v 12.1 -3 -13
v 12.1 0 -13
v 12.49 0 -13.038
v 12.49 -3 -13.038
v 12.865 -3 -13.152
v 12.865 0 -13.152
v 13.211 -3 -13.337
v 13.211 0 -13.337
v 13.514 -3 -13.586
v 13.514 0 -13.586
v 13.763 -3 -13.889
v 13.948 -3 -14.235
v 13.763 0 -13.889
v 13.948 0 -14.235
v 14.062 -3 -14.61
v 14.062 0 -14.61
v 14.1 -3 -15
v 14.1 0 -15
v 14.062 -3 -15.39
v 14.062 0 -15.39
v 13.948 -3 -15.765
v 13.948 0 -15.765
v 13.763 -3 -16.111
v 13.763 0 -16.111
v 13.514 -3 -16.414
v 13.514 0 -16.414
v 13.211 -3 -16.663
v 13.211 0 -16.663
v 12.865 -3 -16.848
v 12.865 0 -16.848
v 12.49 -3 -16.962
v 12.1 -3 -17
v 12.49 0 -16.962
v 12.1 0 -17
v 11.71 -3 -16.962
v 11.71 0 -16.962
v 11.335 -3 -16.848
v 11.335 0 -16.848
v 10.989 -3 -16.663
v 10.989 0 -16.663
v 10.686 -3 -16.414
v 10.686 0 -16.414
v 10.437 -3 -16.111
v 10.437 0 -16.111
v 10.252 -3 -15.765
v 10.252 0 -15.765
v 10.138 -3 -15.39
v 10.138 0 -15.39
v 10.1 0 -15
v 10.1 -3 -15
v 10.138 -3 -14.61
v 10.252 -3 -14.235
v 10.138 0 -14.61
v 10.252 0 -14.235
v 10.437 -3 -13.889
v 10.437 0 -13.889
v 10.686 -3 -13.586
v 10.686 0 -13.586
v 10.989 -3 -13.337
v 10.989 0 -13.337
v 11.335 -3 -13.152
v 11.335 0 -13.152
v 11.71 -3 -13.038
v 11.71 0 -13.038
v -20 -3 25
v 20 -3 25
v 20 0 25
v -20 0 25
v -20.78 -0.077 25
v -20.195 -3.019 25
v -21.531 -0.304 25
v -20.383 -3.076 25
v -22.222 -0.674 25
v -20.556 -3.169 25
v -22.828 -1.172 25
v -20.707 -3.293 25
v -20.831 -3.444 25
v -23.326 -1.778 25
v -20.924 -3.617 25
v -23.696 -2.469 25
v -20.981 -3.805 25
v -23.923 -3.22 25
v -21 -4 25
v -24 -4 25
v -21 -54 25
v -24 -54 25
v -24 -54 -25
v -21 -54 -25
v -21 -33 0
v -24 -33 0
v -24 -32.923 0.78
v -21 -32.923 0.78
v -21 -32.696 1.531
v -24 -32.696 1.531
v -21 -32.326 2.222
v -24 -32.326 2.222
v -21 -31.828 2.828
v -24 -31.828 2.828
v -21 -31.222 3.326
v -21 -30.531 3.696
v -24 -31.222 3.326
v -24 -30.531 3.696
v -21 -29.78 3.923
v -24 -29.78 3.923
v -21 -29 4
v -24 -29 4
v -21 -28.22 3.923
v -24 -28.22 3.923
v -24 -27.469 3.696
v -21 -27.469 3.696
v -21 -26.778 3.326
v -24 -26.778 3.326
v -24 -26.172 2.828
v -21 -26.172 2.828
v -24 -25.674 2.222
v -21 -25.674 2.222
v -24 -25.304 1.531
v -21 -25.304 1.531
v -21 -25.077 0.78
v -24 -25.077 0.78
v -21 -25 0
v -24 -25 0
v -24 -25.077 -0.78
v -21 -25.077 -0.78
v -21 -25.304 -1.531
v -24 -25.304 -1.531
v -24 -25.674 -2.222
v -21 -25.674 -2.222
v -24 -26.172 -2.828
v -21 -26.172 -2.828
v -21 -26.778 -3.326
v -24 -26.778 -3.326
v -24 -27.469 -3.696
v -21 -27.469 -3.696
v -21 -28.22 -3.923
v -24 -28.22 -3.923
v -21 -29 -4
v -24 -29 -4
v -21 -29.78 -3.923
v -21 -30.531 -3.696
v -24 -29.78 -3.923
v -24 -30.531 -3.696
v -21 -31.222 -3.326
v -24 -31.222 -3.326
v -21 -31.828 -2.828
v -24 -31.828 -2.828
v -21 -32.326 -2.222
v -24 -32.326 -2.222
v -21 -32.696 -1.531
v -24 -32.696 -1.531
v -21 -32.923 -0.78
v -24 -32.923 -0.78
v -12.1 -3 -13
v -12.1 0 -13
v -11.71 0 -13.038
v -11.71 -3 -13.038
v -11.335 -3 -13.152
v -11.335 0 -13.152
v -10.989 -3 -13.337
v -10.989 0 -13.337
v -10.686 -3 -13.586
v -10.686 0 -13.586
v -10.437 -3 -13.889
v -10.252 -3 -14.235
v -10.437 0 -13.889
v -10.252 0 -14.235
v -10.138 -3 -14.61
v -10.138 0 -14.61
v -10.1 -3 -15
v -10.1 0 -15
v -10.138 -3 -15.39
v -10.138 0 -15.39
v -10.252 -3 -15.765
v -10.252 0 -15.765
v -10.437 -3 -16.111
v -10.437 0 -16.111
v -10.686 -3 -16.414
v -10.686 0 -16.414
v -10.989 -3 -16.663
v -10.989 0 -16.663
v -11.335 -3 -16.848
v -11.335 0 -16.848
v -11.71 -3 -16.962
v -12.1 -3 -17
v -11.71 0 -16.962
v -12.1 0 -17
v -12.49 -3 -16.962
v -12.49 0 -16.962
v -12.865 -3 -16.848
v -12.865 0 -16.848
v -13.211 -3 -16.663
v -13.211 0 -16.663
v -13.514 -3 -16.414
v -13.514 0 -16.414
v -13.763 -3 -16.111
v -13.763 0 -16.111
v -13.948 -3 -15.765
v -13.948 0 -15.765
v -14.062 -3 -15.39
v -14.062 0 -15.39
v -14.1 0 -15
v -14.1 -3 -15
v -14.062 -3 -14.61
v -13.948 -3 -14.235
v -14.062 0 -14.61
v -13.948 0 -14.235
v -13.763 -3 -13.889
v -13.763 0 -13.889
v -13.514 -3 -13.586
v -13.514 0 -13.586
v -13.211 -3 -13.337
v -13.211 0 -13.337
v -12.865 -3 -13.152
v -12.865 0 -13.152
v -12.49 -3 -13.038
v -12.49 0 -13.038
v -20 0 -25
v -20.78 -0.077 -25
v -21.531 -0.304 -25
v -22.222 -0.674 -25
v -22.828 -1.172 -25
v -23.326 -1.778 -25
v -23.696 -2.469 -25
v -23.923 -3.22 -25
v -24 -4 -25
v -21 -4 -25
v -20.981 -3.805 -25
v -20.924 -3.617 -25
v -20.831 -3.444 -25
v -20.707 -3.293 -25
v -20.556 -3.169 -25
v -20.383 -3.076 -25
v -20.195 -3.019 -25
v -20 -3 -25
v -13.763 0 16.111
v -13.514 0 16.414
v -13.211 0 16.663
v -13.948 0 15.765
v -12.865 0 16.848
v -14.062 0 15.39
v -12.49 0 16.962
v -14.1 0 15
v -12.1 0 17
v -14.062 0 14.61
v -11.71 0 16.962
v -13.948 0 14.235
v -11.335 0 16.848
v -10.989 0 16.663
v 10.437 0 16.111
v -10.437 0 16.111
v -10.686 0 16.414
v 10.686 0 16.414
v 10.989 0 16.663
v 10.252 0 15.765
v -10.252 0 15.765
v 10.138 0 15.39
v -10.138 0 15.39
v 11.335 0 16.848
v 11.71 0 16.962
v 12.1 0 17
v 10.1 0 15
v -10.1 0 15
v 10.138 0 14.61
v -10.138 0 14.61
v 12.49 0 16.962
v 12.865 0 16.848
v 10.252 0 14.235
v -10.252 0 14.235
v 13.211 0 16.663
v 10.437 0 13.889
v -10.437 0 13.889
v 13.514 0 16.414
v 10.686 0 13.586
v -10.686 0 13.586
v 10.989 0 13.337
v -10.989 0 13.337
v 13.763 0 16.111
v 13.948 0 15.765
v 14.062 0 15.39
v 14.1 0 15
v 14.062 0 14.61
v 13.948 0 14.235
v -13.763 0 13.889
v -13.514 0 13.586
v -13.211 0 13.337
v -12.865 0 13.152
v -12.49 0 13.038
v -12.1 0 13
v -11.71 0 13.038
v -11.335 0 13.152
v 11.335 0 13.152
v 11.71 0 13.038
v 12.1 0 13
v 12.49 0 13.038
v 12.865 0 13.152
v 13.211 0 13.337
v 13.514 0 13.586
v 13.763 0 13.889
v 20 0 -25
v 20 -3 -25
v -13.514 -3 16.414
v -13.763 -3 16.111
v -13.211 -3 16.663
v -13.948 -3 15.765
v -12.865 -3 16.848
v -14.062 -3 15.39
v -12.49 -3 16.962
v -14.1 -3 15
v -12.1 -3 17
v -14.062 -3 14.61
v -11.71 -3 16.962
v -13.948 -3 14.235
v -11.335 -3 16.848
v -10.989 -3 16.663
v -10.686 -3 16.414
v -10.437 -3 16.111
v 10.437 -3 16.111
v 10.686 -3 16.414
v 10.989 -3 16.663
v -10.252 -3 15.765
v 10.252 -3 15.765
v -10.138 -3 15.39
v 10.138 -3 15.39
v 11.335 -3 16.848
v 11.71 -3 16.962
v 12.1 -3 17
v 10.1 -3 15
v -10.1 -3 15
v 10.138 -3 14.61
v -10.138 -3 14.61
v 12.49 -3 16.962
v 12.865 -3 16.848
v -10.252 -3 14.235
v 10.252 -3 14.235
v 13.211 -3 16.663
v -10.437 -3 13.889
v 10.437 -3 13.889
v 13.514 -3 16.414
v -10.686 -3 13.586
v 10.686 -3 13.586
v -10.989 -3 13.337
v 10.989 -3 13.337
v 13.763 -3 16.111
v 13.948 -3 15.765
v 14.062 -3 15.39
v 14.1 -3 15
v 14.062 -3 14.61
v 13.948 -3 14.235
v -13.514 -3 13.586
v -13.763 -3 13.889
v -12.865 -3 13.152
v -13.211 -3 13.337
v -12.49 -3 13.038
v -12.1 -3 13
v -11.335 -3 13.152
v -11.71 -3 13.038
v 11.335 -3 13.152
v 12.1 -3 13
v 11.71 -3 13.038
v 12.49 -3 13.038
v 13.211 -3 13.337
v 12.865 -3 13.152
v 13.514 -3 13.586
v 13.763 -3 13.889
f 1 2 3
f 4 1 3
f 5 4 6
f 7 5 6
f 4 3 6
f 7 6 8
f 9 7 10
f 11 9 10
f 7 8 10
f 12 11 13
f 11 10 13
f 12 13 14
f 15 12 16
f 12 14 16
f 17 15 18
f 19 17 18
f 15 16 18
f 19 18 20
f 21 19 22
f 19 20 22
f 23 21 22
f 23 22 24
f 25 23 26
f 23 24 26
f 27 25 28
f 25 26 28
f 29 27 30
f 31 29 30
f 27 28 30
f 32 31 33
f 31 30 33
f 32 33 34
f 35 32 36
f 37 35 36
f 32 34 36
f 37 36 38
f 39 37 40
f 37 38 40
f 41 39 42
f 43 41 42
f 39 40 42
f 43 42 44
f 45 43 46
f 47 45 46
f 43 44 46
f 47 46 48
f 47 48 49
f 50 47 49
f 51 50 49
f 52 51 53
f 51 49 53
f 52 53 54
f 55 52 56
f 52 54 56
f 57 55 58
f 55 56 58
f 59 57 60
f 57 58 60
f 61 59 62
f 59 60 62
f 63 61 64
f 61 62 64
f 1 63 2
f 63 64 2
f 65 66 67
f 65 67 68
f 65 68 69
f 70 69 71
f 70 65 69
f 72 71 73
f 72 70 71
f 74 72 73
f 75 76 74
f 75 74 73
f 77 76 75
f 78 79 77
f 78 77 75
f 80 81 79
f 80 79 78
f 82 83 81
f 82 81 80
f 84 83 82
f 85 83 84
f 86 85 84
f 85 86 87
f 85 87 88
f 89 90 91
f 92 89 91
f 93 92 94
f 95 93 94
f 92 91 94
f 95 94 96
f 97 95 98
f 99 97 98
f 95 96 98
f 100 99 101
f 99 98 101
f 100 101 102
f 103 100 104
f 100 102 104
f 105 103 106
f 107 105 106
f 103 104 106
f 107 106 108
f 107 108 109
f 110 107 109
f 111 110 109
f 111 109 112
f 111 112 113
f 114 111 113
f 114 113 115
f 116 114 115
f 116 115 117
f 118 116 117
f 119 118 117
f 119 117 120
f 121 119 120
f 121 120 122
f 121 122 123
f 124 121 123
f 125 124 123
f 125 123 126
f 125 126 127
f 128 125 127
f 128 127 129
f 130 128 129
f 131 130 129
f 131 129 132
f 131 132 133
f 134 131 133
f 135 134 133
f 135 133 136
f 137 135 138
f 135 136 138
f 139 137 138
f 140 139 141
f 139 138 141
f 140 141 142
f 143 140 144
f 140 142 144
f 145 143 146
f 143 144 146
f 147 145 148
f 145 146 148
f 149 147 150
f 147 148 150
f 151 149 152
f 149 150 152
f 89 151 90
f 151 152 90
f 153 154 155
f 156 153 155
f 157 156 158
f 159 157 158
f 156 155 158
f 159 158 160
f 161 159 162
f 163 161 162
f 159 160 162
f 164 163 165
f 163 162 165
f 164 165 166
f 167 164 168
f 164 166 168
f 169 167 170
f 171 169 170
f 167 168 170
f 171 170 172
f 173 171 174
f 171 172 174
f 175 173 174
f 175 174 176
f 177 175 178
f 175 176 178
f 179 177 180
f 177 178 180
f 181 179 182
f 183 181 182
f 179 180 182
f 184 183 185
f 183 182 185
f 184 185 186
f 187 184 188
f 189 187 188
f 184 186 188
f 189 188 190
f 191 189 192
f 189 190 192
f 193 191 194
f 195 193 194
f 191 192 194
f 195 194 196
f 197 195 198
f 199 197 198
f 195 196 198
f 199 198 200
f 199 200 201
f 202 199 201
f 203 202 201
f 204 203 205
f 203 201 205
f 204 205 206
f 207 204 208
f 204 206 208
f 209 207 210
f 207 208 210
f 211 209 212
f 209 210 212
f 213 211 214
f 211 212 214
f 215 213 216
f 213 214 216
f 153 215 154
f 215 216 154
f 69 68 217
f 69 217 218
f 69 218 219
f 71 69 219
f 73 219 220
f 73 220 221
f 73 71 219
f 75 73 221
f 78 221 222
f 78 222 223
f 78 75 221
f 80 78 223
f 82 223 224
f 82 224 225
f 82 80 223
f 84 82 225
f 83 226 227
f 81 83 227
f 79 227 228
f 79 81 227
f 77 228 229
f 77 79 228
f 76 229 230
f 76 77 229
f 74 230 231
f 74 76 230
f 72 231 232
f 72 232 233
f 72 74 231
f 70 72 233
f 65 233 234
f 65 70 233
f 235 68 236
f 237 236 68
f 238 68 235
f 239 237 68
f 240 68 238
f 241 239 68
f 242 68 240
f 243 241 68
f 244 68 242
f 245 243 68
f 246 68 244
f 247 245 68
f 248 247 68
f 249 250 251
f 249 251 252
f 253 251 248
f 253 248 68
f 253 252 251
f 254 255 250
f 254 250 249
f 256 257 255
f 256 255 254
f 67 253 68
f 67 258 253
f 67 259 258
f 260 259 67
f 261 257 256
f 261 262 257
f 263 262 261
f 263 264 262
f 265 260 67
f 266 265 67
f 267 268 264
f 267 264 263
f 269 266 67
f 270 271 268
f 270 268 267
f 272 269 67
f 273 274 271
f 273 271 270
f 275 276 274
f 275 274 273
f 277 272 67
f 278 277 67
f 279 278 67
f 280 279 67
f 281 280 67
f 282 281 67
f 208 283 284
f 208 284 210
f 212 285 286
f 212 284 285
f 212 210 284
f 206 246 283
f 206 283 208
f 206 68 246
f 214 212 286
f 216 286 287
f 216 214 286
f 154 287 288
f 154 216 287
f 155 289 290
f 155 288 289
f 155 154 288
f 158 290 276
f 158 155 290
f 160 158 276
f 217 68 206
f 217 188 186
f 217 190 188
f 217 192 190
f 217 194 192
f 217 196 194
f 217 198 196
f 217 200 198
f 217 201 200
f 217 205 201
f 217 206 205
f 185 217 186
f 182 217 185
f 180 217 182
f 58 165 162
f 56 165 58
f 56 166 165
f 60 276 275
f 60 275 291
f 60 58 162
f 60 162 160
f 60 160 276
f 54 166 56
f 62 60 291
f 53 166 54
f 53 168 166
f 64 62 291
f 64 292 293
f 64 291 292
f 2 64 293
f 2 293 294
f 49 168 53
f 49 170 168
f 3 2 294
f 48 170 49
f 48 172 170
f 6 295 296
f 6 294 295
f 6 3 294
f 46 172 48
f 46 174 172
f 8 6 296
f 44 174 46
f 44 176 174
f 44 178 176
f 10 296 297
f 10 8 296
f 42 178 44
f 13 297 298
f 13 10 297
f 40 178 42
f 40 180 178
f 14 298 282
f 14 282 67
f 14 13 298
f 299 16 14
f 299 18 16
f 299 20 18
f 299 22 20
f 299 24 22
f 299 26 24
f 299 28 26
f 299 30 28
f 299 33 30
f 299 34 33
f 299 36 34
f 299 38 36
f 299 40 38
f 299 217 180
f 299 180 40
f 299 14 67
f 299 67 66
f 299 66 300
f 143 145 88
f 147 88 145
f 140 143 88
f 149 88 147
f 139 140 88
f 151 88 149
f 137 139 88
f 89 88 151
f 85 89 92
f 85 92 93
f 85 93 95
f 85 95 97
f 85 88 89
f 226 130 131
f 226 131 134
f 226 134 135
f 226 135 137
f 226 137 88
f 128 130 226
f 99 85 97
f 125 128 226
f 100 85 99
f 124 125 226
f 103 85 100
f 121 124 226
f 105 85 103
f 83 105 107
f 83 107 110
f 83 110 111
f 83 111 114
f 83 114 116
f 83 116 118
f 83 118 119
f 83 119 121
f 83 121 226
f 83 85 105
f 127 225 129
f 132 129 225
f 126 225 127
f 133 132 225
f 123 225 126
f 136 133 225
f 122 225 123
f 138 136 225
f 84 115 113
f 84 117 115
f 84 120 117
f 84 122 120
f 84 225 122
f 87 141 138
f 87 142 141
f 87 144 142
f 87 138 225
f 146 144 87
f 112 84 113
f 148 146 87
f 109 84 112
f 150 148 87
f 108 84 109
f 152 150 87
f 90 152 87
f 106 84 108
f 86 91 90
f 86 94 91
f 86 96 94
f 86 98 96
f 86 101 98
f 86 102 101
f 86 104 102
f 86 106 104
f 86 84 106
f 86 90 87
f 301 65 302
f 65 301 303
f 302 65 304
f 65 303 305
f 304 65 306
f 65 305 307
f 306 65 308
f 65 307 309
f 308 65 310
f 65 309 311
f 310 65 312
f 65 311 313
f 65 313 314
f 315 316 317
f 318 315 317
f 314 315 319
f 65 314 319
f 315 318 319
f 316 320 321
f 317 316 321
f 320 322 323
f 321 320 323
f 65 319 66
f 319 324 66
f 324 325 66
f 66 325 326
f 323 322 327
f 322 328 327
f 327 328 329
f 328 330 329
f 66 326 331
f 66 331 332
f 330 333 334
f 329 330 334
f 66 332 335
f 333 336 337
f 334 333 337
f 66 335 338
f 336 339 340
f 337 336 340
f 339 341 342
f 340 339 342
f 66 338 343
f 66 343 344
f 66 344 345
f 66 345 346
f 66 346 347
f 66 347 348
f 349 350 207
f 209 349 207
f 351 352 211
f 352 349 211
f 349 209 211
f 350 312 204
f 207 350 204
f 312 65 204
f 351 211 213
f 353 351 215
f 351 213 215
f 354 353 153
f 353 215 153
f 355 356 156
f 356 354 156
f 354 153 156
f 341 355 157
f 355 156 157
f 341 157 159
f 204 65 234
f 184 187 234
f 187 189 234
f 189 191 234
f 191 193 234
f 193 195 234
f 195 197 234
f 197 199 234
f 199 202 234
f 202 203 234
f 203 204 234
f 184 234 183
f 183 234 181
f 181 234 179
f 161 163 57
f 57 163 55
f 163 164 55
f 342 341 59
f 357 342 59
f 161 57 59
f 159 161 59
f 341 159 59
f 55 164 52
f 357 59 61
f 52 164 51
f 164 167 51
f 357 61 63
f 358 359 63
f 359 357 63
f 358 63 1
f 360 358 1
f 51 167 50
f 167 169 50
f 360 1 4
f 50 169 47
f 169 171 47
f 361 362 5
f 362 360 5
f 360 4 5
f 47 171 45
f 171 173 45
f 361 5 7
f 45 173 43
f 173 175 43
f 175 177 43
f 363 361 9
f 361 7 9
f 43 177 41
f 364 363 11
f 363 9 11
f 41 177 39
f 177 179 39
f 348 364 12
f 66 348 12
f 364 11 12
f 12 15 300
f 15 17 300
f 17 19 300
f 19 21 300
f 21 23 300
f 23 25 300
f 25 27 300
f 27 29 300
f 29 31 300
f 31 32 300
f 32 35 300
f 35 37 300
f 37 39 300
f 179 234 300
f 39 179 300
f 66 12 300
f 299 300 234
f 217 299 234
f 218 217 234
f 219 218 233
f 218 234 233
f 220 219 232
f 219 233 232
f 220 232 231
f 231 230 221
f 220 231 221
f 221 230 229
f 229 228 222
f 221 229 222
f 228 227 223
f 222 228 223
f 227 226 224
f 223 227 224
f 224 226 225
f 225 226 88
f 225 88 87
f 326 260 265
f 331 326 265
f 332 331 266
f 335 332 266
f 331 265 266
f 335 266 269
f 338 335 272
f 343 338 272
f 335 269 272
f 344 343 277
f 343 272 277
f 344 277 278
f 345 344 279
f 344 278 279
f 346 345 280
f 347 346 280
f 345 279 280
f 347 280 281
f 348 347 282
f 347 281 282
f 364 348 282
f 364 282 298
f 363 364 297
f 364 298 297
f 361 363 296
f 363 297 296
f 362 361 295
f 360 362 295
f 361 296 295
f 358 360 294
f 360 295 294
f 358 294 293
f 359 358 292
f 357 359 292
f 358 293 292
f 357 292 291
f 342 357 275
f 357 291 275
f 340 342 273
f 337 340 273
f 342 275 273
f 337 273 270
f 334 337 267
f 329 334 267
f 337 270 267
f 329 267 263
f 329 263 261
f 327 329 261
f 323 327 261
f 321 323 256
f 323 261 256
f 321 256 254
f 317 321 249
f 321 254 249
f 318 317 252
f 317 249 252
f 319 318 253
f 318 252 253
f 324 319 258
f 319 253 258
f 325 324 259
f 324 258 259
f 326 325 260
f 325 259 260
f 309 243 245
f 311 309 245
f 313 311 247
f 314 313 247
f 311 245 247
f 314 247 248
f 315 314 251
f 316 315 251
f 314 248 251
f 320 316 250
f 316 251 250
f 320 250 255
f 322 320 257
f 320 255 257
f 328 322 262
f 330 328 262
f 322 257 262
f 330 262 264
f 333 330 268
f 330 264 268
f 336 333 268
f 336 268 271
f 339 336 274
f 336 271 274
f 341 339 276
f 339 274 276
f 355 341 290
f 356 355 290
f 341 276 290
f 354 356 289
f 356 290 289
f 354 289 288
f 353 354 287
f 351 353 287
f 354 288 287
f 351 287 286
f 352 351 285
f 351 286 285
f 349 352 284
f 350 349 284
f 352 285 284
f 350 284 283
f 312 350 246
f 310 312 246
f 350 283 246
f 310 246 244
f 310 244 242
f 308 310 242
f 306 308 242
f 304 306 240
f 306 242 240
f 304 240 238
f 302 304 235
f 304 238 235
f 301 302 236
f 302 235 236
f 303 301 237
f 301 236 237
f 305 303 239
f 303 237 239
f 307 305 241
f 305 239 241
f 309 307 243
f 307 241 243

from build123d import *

# Parameters (mm, degrees)
SKETCH_1_W             = 40
SKETCH_1_H             = 50
SKETCH_1_R             = 2
SM_BASE_FLANGE_1_DEPTH = 3
SM_EDGE_FLANGE_1_DEPTH = 50
SKETCH_12_R            = 4
CUT_EXTRUDE_1_DEPTH    = 75.006756448


# Sheet-metal steps are written as plain solids
with BuildPart() as part:
    # Sketch 1 → 基体-法兰1 (new body)
    with BuildSketch(Plane(origin=(0, 0, 0), x_dir=(1, 0, 0), z_dir=(0, 1, 0))):
        Rectangle(SKETCH_1_W, SKETCH_1_H)
        with Locations(Location((12.1, 15, 0), (0, 0, 270))):
            Circle(SKETCH_1_R, mode=Mode.SUBTRACT)
        with Locations(Location((-12.1, -15, 0), (0, 0, 270))):
            Circle(SKETCH_1_R, mode=Mode.SUBTRACT)
        with Locations(Location((-12.1, 15, 0), (0, 0, 270))):
            Circle(SKETCH_1_R, mode=Mode.SUBTRACT)
        with Locations(Location((12.1, -15, 0), (0, 0, 270))):
            Circle(SKETCH_1_R, mode=Mode.SUBTRACT)
    extrude(amount=-SM_BASE_FLANGE_1_DEPTH)

    # 边线-法兰1 section (across the edge) → 边线-法兰1 (add)
    with BuildSketch(Plane(origin=(-21, -3, 25), x_dir=(1, 0, 0), z_dir=(0, 0, -1))):
        with BuildLine():
            Line((-3, 1), (-3, 51))
            Line((-3, 51), (0, 51))
            Line((0, 51), (0, 1))
            ThreePointArc((0, 1), (0.292893219, 0.292893219), (1, 0))
            Line((1, 0), (1, -3))
            ThreePointArc((1, -3), (-1.828427125, -1.828427125), (-3, 1))
        make_face()
    extrude(amount=SM_EDGE_FLANGE_1_DEPTH)

    # 草图12 → 切除-拉伸1 (cut, through all)
    with BuildSketch(Plane.ZY.offset(24)):
        with Locations(Location((0, -29, 0), (0, 0, 270))):
            Circle(SKETCH_12_R)
    extrude(amount=-CUT_EXTRUDE_1_DEPTH, mode=Mode.SUBTRACT)


solid = part.part
